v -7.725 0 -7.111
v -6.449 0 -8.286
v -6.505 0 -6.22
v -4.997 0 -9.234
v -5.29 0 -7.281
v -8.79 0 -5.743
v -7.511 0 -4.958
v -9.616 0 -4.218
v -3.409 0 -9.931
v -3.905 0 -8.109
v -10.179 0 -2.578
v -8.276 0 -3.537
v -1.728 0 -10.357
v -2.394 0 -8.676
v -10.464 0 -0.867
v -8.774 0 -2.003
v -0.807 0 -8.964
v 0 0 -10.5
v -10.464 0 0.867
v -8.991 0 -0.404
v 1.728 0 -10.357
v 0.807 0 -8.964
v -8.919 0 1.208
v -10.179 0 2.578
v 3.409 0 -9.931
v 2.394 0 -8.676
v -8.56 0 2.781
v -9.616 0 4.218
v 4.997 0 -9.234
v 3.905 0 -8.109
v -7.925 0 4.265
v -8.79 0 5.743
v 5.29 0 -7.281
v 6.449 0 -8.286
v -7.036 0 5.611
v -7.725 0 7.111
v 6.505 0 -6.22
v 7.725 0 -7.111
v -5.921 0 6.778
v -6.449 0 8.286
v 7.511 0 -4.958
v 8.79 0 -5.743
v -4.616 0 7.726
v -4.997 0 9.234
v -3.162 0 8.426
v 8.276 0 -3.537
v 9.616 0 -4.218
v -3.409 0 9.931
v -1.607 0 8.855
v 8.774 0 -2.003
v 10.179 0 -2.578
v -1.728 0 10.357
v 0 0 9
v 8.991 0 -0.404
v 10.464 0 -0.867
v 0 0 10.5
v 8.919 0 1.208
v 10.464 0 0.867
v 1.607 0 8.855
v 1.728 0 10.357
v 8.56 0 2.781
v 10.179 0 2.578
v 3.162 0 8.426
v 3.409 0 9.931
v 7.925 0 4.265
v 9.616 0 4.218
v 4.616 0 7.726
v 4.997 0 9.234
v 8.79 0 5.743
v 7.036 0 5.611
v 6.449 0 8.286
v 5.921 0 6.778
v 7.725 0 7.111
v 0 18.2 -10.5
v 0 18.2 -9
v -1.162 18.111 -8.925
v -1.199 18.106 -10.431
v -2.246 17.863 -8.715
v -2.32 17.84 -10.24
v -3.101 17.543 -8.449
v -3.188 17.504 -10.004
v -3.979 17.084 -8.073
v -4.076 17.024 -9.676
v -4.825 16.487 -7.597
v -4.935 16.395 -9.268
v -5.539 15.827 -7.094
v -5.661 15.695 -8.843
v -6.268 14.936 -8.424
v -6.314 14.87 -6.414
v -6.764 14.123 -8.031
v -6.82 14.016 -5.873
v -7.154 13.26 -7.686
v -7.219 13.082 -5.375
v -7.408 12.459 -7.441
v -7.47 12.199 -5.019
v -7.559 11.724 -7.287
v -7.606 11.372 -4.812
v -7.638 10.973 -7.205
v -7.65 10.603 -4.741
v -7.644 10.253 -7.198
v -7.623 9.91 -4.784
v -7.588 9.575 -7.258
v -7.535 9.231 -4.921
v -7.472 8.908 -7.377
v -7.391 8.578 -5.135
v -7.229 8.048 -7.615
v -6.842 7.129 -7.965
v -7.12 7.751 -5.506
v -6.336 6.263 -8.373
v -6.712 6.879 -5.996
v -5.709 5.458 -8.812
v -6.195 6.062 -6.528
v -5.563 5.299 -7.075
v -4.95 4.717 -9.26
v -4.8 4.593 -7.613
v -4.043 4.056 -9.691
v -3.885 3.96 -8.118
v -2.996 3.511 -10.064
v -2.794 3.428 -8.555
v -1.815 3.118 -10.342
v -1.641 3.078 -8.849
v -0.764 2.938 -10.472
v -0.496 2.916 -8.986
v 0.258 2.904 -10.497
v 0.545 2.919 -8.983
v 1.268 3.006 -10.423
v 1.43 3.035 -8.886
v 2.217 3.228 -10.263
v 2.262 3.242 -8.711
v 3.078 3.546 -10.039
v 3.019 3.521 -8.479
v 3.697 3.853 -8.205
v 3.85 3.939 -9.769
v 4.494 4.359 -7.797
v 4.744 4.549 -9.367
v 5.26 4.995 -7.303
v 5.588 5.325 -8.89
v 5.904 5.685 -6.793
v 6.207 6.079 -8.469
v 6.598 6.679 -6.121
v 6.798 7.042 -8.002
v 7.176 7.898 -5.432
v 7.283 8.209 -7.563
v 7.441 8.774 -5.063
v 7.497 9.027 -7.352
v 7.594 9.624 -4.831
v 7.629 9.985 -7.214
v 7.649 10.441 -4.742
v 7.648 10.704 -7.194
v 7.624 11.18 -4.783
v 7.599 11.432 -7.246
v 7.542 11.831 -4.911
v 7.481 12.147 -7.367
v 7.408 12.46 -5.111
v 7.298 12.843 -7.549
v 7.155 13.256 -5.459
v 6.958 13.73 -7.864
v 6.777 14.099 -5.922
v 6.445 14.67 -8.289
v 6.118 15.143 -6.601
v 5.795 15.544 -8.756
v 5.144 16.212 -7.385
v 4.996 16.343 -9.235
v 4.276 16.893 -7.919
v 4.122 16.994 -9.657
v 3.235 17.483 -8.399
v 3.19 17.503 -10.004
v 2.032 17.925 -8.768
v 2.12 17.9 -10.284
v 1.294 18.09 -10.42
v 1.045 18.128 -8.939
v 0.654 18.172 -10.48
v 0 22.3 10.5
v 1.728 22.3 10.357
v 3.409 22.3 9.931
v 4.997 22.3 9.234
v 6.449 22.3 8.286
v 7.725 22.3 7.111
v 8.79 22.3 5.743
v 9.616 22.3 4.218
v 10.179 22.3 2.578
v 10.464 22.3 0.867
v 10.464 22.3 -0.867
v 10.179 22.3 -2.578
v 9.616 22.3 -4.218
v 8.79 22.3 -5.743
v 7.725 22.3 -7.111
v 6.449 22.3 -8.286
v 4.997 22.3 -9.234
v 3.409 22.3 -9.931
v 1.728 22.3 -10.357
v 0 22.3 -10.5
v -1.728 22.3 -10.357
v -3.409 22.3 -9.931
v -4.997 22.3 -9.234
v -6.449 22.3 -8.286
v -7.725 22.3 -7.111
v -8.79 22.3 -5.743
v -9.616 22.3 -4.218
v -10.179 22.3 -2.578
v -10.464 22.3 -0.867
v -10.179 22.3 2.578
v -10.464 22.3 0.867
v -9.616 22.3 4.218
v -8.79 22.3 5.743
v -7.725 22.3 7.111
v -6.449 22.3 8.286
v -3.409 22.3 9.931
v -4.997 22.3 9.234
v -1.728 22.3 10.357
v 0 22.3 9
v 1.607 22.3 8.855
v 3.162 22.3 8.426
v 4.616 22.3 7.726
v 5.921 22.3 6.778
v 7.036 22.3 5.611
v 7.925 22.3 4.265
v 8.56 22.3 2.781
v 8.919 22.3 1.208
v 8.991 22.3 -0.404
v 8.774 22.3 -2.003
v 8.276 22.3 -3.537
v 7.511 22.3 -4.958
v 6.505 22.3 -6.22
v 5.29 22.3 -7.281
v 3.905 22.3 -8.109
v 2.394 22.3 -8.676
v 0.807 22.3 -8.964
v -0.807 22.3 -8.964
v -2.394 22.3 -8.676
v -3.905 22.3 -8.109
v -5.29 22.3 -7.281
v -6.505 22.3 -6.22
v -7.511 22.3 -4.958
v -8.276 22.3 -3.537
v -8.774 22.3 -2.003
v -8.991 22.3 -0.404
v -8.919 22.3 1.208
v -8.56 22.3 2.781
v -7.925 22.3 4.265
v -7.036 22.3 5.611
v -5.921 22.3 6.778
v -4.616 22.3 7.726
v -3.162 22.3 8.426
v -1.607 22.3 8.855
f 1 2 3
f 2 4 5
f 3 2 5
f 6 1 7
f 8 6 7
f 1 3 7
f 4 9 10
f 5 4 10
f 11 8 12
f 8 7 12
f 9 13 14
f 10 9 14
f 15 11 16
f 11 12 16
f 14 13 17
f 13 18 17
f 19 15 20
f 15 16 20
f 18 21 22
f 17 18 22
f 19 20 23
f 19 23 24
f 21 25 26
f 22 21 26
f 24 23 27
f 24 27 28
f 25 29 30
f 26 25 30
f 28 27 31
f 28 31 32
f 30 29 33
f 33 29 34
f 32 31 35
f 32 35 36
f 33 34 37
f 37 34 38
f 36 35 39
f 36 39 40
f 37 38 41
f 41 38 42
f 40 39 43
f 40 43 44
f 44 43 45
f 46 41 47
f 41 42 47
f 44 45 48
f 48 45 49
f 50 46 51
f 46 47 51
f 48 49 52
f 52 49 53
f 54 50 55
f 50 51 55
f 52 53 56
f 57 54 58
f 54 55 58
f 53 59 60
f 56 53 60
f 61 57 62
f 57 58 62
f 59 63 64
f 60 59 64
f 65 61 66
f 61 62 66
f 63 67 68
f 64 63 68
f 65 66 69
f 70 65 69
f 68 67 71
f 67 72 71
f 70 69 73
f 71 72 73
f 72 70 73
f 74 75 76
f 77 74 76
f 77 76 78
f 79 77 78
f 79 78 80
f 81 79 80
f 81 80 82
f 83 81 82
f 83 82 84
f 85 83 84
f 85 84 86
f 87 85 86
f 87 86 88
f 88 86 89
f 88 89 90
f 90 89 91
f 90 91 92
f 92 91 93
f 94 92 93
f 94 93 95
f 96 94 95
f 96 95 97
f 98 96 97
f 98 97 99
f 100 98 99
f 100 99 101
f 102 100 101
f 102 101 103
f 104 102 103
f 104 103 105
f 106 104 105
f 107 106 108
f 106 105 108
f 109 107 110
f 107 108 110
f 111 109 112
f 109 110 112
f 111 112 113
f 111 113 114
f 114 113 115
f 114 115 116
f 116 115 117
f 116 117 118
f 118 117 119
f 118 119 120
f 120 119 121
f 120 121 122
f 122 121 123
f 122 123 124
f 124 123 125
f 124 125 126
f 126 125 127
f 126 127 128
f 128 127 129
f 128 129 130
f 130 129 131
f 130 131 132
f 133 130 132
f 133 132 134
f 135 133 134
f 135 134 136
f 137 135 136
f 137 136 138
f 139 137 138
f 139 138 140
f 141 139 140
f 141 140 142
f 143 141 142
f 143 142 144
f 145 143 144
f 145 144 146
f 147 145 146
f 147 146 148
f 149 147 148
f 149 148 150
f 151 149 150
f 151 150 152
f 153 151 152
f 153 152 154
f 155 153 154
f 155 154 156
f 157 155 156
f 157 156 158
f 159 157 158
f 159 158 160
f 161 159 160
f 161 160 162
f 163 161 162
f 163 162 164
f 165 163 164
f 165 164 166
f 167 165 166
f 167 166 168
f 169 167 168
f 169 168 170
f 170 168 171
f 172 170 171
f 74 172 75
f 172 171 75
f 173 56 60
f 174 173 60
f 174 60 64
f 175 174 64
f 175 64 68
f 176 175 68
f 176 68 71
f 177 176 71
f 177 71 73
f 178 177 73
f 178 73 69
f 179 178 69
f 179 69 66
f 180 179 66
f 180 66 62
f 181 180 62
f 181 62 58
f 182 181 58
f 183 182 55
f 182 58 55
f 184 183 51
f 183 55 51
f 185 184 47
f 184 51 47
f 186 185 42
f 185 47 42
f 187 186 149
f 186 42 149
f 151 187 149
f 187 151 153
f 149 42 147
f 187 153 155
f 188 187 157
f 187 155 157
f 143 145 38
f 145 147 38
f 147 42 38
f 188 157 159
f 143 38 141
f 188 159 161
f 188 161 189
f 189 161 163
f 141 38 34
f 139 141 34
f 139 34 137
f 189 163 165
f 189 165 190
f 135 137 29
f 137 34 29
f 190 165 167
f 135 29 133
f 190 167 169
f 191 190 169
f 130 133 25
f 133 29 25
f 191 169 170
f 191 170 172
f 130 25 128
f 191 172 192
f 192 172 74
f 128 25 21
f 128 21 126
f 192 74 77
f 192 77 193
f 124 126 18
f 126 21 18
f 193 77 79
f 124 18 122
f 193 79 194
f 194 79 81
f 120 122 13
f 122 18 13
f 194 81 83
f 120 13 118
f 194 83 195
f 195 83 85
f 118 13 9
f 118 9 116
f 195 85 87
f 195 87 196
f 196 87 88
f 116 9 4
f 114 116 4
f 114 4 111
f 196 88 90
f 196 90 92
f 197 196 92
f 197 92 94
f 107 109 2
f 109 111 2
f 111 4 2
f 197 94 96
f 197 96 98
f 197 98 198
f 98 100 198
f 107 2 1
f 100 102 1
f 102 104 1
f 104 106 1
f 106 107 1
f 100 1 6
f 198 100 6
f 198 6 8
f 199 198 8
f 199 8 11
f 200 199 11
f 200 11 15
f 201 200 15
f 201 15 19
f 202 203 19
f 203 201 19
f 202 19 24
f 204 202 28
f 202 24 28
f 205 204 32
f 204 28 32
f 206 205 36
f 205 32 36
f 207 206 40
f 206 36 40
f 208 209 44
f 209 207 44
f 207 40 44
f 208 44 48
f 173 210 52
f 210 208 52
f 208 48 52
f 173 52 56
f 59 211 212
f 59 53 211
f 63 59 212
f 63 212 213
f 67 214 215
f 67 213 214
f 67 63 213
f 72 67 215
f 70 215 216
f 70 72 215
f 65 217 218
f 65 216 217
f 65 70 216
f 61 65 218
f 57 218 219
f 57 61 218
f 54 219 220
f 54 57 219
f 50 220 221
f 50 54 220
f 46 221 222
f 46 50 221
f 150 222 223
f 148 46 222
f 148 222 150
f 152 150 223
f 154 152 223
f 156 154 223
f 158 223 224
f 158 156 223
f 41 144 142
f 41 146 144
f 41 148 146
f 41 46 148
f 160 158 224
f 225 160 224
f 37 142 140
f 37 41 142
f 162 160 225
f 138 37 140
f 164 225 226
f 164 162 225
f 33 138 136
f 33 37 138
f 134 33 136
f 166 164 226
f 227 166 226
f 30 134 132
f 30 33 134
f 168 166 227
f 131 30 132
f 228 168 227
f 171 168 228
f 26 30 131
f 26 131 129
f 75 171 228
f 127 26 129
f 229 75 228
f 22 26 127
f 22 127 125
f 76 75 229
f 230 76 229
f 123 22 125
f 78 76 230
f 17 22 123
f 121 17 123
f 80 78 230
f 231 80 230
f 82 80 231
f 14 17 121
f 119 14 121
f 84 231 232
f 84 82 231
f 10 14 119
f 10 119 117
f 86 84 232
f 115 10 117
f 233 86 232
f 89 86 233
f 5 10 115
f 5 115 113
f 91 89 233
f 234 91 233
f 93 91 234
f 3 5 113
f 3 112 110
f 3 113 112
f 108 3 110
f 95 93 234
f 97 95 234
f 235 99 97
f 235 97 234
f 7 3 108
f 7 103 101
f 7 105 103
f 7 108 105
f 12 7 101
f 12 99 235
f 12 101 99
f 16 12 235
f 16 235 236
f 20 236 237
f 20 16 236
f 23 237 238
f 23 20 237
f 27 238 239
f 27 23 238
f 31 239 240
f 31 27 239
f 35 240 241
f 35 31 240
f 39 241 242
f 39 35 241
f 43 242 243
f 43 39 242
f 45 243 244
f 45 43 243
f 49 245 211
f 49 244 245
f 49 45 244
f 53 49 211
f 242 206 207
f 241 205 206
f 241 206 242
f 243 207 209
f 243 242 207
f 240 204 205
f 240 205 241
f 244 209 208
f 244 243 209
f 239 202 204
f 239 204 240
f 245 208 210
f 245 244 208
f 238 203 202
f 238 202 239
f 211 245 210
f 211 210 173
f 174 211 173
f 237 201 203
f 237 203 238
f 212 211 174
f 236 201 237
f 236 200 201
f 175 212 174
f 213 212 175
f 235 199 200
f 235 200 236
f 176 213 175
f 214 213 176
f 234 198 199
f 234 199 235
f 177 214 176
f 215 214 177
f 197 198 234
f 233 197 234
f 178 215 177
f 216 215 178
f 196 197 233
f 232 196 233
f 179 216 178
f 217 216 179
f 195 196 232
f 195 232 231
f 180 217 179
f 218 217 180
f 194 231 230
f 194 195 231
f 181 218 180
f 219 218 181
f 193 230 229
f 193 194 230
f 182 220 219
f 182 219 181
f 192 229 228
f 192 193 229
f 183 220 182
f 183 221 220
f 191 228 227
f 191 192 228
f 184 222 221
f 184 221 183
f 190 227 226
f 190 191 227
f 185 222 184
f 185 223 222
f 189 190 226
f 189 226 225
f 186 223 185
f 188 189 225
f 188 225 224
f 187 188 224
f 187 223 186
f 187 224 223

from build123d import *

# Parameters (mm, degrees)
SKETCH1_R           = 10.5
SKETCH1_R_2         = 9
BOSS_EXTRUDE1_DEPTH = 38.3
SKETCH2_R           = 1
SKETCH2_R_2         = 9
BOSS_EXTRUDE2_DEPTH = 1.5
FILLET1_R           = 0.5
SKETCH10_R          = 7.65
CUT_EXTRUDE1_DEPTH  = 46.293682625
SKETCH15_R          = 20.755300819
CUT_EXTRUDE3_DEPTH  = 17.5


with BuildPart() as part:
    # Sketch1 → Boss-Extrude1 (new body)
    with BuildSketch(Plane(origin=(0, 0, 0), x_dir=(1, 0, 0), z_dir=(0, 1, 0))):
        with Locations(Location((0, 0, 0), (0, 0, 270))):
            Circle(SKETCH1_R)
        with Locations(Location((0, 0, 0), (0, 0, 270))):
            Circle(SKETCH1_R_2, mode=Mode.SUBTRACT)
    extrude(amount=BOSS_EXTRUDE1_DEPTH)

    # Sketch2 → Boss-Extrude2 (add)
    with BuildSketch(Plane(origin=(0, 38.3, 0), x_dir=(1, 0, 0), z_dir=(0, 1, 0))):
        with BuildLine():
            Line((-3, -12.1346611), (-3, -12.5))
            ThreePointArc((-3, -12.5), (0, -15.5), (3, -12.5))
            Line((3, -12.5), (3, -12.1346611))
            ThreePointArc((3, -12.1346611), (6.25, -10.825317547), (9.008924778, -8.665406761))
            Line((9.008924778, -8.665406761), (9.325317547, -8.848076211))
            ThreePointArc((9.325317547, -8.848076211), (13.423393759, -7.75), (12.325317547, -3.651923789))
            Line((12.325317547, -3.651923789), (12.008924778, -3.469254338))
            ThreePointArc((12.008924778, -3.469254338), (12.393060767, -1.631577403), (12.497639685, 0.24290392))
            Line((12.497639685, 0.24290392), (12.850529964, 0.337460585))
            ThreePointArc((12.850529964, 0.337460585), (14.971850307, 4.011695199), (11.297615693, 6.133015543))
            Line((11.297615693, 6.133015543), (10.944725414, 6.038458877))
            ThreePointArc((10.944725414, 6.038458877), (7.609517863, 9.916916754), (3, 12.1346611))
            Line((3, 12.1346611), (3, 12.5))
            ThreePointArc((3, 12.5), (0, 15.5), (-3, 12.5))
            Line((-3, 12.5), (-3, 12.1346611))
            ThreePointArc((-3, 12.1346611), (-7.609517863, 9.916916754), (-10.944725414, 6.038458877))
            Line((-10.944725414, 6.038458877), (-11.297615693, 6.133015543))
            ThreePointArc((-11.297615693, 6.133015543), (-14.971850307, 4.011695199), (-12.850529964, 0.337460585))
            Line((-12.850529964, 0.337460585), (-12.497639685, 0.24290392))
            ThreePointArc((-12.497639685, 0.24290392), (-12.393060767, -1.631577403), (-12.008924778, -3.469254338))
            Line((-12.008924778, -3.469254338), (-12.325317547, -3.651923789))
            ThreePointArc((-12.325317547, -3.651923789), (-13.423393759, -7.75), (-9.325317547, -8.848076211))
            Line((-9.325317547, -8.848076211), (-9.008924778, -8.665406761))
            ThreePointArc((-9.008924778, -8.665406761), (-6.25, -10.825317547), (-3, -12.1346611))
        make_face()
        with Locations(Location((-12.074072829, 3.235238064, 0), (0, 0, 270))):
            Circle(SKETCH2_R, mode=Mode.SUBTRACT)
        with Locations(Location((0, 0, 0), (0, 0, 270))):
            Circle(SKETCH2_R_2, mode=Mode.SUBTRACT)
        with Locations((12.074072829, 3.235238064)):
            Circle(SKETCH2_R, mode=Mode.SUBTRACT)
        with Locations(Location((0, -12.5, 0), (0, 0, 270))):
            Circle(SKETCH2_R, mode=Mode.SUBTRACT)
    extrude(amount=BOSS_EXTRUDE2_DEPTH)

    # Fillet1
    fillet1_edges = [part.edges().sort_by_distance(p)[0] for p in [
        (-3, 39.05, 12.1346611),
        (3, 39.05, 12.1346611),
        (9.008924778, 39.05, 8.665406761),
        (12.008924778, 39.05, 3.469254338),
        (12.497639685, 39.05, -0.24290392),
        (10.944725414, 39.05, -6.038458877),
        (3, 39.05, -12.1346611),
        (-3, 39.05, -12.1346611),
        (-10.944725414, 39.05, -6.038458877),
        (-12.497639685, 39.05, -0.24290392),
        (-12.008924778, 39.05, 3.469254338),
        (-9.008924778, 39.05, 8.665406761),
    ]]
    fillet(fillet1_edges, radius=FILLET1_R)

    # Sketch10 → Cut-Extrude1 (cut, through all)
    with BuildSketch(Plane.XY):
        with Locations(Location((0, 10.55, 0), (0, 0, 90))):
            Circle(SKETCH10_R)
    extrude(amount=-CUT_EXTRUDE1_DEPTH, mode=Mode.SUBTRACT)

    # Sketch15 → Cut-Extrude3 (cut)
    with BuildSketch(Plane(origin=(0, 39.8, 0), x_dir=(1, 0, 0), z_dir=(0, 1, 0))):
        Circle(SKETCH15_R)
    extrude(amount=-CUT_EXTRUDE3_DEPTH, mode=Mode.SUBTRACT)


solid = part.part
